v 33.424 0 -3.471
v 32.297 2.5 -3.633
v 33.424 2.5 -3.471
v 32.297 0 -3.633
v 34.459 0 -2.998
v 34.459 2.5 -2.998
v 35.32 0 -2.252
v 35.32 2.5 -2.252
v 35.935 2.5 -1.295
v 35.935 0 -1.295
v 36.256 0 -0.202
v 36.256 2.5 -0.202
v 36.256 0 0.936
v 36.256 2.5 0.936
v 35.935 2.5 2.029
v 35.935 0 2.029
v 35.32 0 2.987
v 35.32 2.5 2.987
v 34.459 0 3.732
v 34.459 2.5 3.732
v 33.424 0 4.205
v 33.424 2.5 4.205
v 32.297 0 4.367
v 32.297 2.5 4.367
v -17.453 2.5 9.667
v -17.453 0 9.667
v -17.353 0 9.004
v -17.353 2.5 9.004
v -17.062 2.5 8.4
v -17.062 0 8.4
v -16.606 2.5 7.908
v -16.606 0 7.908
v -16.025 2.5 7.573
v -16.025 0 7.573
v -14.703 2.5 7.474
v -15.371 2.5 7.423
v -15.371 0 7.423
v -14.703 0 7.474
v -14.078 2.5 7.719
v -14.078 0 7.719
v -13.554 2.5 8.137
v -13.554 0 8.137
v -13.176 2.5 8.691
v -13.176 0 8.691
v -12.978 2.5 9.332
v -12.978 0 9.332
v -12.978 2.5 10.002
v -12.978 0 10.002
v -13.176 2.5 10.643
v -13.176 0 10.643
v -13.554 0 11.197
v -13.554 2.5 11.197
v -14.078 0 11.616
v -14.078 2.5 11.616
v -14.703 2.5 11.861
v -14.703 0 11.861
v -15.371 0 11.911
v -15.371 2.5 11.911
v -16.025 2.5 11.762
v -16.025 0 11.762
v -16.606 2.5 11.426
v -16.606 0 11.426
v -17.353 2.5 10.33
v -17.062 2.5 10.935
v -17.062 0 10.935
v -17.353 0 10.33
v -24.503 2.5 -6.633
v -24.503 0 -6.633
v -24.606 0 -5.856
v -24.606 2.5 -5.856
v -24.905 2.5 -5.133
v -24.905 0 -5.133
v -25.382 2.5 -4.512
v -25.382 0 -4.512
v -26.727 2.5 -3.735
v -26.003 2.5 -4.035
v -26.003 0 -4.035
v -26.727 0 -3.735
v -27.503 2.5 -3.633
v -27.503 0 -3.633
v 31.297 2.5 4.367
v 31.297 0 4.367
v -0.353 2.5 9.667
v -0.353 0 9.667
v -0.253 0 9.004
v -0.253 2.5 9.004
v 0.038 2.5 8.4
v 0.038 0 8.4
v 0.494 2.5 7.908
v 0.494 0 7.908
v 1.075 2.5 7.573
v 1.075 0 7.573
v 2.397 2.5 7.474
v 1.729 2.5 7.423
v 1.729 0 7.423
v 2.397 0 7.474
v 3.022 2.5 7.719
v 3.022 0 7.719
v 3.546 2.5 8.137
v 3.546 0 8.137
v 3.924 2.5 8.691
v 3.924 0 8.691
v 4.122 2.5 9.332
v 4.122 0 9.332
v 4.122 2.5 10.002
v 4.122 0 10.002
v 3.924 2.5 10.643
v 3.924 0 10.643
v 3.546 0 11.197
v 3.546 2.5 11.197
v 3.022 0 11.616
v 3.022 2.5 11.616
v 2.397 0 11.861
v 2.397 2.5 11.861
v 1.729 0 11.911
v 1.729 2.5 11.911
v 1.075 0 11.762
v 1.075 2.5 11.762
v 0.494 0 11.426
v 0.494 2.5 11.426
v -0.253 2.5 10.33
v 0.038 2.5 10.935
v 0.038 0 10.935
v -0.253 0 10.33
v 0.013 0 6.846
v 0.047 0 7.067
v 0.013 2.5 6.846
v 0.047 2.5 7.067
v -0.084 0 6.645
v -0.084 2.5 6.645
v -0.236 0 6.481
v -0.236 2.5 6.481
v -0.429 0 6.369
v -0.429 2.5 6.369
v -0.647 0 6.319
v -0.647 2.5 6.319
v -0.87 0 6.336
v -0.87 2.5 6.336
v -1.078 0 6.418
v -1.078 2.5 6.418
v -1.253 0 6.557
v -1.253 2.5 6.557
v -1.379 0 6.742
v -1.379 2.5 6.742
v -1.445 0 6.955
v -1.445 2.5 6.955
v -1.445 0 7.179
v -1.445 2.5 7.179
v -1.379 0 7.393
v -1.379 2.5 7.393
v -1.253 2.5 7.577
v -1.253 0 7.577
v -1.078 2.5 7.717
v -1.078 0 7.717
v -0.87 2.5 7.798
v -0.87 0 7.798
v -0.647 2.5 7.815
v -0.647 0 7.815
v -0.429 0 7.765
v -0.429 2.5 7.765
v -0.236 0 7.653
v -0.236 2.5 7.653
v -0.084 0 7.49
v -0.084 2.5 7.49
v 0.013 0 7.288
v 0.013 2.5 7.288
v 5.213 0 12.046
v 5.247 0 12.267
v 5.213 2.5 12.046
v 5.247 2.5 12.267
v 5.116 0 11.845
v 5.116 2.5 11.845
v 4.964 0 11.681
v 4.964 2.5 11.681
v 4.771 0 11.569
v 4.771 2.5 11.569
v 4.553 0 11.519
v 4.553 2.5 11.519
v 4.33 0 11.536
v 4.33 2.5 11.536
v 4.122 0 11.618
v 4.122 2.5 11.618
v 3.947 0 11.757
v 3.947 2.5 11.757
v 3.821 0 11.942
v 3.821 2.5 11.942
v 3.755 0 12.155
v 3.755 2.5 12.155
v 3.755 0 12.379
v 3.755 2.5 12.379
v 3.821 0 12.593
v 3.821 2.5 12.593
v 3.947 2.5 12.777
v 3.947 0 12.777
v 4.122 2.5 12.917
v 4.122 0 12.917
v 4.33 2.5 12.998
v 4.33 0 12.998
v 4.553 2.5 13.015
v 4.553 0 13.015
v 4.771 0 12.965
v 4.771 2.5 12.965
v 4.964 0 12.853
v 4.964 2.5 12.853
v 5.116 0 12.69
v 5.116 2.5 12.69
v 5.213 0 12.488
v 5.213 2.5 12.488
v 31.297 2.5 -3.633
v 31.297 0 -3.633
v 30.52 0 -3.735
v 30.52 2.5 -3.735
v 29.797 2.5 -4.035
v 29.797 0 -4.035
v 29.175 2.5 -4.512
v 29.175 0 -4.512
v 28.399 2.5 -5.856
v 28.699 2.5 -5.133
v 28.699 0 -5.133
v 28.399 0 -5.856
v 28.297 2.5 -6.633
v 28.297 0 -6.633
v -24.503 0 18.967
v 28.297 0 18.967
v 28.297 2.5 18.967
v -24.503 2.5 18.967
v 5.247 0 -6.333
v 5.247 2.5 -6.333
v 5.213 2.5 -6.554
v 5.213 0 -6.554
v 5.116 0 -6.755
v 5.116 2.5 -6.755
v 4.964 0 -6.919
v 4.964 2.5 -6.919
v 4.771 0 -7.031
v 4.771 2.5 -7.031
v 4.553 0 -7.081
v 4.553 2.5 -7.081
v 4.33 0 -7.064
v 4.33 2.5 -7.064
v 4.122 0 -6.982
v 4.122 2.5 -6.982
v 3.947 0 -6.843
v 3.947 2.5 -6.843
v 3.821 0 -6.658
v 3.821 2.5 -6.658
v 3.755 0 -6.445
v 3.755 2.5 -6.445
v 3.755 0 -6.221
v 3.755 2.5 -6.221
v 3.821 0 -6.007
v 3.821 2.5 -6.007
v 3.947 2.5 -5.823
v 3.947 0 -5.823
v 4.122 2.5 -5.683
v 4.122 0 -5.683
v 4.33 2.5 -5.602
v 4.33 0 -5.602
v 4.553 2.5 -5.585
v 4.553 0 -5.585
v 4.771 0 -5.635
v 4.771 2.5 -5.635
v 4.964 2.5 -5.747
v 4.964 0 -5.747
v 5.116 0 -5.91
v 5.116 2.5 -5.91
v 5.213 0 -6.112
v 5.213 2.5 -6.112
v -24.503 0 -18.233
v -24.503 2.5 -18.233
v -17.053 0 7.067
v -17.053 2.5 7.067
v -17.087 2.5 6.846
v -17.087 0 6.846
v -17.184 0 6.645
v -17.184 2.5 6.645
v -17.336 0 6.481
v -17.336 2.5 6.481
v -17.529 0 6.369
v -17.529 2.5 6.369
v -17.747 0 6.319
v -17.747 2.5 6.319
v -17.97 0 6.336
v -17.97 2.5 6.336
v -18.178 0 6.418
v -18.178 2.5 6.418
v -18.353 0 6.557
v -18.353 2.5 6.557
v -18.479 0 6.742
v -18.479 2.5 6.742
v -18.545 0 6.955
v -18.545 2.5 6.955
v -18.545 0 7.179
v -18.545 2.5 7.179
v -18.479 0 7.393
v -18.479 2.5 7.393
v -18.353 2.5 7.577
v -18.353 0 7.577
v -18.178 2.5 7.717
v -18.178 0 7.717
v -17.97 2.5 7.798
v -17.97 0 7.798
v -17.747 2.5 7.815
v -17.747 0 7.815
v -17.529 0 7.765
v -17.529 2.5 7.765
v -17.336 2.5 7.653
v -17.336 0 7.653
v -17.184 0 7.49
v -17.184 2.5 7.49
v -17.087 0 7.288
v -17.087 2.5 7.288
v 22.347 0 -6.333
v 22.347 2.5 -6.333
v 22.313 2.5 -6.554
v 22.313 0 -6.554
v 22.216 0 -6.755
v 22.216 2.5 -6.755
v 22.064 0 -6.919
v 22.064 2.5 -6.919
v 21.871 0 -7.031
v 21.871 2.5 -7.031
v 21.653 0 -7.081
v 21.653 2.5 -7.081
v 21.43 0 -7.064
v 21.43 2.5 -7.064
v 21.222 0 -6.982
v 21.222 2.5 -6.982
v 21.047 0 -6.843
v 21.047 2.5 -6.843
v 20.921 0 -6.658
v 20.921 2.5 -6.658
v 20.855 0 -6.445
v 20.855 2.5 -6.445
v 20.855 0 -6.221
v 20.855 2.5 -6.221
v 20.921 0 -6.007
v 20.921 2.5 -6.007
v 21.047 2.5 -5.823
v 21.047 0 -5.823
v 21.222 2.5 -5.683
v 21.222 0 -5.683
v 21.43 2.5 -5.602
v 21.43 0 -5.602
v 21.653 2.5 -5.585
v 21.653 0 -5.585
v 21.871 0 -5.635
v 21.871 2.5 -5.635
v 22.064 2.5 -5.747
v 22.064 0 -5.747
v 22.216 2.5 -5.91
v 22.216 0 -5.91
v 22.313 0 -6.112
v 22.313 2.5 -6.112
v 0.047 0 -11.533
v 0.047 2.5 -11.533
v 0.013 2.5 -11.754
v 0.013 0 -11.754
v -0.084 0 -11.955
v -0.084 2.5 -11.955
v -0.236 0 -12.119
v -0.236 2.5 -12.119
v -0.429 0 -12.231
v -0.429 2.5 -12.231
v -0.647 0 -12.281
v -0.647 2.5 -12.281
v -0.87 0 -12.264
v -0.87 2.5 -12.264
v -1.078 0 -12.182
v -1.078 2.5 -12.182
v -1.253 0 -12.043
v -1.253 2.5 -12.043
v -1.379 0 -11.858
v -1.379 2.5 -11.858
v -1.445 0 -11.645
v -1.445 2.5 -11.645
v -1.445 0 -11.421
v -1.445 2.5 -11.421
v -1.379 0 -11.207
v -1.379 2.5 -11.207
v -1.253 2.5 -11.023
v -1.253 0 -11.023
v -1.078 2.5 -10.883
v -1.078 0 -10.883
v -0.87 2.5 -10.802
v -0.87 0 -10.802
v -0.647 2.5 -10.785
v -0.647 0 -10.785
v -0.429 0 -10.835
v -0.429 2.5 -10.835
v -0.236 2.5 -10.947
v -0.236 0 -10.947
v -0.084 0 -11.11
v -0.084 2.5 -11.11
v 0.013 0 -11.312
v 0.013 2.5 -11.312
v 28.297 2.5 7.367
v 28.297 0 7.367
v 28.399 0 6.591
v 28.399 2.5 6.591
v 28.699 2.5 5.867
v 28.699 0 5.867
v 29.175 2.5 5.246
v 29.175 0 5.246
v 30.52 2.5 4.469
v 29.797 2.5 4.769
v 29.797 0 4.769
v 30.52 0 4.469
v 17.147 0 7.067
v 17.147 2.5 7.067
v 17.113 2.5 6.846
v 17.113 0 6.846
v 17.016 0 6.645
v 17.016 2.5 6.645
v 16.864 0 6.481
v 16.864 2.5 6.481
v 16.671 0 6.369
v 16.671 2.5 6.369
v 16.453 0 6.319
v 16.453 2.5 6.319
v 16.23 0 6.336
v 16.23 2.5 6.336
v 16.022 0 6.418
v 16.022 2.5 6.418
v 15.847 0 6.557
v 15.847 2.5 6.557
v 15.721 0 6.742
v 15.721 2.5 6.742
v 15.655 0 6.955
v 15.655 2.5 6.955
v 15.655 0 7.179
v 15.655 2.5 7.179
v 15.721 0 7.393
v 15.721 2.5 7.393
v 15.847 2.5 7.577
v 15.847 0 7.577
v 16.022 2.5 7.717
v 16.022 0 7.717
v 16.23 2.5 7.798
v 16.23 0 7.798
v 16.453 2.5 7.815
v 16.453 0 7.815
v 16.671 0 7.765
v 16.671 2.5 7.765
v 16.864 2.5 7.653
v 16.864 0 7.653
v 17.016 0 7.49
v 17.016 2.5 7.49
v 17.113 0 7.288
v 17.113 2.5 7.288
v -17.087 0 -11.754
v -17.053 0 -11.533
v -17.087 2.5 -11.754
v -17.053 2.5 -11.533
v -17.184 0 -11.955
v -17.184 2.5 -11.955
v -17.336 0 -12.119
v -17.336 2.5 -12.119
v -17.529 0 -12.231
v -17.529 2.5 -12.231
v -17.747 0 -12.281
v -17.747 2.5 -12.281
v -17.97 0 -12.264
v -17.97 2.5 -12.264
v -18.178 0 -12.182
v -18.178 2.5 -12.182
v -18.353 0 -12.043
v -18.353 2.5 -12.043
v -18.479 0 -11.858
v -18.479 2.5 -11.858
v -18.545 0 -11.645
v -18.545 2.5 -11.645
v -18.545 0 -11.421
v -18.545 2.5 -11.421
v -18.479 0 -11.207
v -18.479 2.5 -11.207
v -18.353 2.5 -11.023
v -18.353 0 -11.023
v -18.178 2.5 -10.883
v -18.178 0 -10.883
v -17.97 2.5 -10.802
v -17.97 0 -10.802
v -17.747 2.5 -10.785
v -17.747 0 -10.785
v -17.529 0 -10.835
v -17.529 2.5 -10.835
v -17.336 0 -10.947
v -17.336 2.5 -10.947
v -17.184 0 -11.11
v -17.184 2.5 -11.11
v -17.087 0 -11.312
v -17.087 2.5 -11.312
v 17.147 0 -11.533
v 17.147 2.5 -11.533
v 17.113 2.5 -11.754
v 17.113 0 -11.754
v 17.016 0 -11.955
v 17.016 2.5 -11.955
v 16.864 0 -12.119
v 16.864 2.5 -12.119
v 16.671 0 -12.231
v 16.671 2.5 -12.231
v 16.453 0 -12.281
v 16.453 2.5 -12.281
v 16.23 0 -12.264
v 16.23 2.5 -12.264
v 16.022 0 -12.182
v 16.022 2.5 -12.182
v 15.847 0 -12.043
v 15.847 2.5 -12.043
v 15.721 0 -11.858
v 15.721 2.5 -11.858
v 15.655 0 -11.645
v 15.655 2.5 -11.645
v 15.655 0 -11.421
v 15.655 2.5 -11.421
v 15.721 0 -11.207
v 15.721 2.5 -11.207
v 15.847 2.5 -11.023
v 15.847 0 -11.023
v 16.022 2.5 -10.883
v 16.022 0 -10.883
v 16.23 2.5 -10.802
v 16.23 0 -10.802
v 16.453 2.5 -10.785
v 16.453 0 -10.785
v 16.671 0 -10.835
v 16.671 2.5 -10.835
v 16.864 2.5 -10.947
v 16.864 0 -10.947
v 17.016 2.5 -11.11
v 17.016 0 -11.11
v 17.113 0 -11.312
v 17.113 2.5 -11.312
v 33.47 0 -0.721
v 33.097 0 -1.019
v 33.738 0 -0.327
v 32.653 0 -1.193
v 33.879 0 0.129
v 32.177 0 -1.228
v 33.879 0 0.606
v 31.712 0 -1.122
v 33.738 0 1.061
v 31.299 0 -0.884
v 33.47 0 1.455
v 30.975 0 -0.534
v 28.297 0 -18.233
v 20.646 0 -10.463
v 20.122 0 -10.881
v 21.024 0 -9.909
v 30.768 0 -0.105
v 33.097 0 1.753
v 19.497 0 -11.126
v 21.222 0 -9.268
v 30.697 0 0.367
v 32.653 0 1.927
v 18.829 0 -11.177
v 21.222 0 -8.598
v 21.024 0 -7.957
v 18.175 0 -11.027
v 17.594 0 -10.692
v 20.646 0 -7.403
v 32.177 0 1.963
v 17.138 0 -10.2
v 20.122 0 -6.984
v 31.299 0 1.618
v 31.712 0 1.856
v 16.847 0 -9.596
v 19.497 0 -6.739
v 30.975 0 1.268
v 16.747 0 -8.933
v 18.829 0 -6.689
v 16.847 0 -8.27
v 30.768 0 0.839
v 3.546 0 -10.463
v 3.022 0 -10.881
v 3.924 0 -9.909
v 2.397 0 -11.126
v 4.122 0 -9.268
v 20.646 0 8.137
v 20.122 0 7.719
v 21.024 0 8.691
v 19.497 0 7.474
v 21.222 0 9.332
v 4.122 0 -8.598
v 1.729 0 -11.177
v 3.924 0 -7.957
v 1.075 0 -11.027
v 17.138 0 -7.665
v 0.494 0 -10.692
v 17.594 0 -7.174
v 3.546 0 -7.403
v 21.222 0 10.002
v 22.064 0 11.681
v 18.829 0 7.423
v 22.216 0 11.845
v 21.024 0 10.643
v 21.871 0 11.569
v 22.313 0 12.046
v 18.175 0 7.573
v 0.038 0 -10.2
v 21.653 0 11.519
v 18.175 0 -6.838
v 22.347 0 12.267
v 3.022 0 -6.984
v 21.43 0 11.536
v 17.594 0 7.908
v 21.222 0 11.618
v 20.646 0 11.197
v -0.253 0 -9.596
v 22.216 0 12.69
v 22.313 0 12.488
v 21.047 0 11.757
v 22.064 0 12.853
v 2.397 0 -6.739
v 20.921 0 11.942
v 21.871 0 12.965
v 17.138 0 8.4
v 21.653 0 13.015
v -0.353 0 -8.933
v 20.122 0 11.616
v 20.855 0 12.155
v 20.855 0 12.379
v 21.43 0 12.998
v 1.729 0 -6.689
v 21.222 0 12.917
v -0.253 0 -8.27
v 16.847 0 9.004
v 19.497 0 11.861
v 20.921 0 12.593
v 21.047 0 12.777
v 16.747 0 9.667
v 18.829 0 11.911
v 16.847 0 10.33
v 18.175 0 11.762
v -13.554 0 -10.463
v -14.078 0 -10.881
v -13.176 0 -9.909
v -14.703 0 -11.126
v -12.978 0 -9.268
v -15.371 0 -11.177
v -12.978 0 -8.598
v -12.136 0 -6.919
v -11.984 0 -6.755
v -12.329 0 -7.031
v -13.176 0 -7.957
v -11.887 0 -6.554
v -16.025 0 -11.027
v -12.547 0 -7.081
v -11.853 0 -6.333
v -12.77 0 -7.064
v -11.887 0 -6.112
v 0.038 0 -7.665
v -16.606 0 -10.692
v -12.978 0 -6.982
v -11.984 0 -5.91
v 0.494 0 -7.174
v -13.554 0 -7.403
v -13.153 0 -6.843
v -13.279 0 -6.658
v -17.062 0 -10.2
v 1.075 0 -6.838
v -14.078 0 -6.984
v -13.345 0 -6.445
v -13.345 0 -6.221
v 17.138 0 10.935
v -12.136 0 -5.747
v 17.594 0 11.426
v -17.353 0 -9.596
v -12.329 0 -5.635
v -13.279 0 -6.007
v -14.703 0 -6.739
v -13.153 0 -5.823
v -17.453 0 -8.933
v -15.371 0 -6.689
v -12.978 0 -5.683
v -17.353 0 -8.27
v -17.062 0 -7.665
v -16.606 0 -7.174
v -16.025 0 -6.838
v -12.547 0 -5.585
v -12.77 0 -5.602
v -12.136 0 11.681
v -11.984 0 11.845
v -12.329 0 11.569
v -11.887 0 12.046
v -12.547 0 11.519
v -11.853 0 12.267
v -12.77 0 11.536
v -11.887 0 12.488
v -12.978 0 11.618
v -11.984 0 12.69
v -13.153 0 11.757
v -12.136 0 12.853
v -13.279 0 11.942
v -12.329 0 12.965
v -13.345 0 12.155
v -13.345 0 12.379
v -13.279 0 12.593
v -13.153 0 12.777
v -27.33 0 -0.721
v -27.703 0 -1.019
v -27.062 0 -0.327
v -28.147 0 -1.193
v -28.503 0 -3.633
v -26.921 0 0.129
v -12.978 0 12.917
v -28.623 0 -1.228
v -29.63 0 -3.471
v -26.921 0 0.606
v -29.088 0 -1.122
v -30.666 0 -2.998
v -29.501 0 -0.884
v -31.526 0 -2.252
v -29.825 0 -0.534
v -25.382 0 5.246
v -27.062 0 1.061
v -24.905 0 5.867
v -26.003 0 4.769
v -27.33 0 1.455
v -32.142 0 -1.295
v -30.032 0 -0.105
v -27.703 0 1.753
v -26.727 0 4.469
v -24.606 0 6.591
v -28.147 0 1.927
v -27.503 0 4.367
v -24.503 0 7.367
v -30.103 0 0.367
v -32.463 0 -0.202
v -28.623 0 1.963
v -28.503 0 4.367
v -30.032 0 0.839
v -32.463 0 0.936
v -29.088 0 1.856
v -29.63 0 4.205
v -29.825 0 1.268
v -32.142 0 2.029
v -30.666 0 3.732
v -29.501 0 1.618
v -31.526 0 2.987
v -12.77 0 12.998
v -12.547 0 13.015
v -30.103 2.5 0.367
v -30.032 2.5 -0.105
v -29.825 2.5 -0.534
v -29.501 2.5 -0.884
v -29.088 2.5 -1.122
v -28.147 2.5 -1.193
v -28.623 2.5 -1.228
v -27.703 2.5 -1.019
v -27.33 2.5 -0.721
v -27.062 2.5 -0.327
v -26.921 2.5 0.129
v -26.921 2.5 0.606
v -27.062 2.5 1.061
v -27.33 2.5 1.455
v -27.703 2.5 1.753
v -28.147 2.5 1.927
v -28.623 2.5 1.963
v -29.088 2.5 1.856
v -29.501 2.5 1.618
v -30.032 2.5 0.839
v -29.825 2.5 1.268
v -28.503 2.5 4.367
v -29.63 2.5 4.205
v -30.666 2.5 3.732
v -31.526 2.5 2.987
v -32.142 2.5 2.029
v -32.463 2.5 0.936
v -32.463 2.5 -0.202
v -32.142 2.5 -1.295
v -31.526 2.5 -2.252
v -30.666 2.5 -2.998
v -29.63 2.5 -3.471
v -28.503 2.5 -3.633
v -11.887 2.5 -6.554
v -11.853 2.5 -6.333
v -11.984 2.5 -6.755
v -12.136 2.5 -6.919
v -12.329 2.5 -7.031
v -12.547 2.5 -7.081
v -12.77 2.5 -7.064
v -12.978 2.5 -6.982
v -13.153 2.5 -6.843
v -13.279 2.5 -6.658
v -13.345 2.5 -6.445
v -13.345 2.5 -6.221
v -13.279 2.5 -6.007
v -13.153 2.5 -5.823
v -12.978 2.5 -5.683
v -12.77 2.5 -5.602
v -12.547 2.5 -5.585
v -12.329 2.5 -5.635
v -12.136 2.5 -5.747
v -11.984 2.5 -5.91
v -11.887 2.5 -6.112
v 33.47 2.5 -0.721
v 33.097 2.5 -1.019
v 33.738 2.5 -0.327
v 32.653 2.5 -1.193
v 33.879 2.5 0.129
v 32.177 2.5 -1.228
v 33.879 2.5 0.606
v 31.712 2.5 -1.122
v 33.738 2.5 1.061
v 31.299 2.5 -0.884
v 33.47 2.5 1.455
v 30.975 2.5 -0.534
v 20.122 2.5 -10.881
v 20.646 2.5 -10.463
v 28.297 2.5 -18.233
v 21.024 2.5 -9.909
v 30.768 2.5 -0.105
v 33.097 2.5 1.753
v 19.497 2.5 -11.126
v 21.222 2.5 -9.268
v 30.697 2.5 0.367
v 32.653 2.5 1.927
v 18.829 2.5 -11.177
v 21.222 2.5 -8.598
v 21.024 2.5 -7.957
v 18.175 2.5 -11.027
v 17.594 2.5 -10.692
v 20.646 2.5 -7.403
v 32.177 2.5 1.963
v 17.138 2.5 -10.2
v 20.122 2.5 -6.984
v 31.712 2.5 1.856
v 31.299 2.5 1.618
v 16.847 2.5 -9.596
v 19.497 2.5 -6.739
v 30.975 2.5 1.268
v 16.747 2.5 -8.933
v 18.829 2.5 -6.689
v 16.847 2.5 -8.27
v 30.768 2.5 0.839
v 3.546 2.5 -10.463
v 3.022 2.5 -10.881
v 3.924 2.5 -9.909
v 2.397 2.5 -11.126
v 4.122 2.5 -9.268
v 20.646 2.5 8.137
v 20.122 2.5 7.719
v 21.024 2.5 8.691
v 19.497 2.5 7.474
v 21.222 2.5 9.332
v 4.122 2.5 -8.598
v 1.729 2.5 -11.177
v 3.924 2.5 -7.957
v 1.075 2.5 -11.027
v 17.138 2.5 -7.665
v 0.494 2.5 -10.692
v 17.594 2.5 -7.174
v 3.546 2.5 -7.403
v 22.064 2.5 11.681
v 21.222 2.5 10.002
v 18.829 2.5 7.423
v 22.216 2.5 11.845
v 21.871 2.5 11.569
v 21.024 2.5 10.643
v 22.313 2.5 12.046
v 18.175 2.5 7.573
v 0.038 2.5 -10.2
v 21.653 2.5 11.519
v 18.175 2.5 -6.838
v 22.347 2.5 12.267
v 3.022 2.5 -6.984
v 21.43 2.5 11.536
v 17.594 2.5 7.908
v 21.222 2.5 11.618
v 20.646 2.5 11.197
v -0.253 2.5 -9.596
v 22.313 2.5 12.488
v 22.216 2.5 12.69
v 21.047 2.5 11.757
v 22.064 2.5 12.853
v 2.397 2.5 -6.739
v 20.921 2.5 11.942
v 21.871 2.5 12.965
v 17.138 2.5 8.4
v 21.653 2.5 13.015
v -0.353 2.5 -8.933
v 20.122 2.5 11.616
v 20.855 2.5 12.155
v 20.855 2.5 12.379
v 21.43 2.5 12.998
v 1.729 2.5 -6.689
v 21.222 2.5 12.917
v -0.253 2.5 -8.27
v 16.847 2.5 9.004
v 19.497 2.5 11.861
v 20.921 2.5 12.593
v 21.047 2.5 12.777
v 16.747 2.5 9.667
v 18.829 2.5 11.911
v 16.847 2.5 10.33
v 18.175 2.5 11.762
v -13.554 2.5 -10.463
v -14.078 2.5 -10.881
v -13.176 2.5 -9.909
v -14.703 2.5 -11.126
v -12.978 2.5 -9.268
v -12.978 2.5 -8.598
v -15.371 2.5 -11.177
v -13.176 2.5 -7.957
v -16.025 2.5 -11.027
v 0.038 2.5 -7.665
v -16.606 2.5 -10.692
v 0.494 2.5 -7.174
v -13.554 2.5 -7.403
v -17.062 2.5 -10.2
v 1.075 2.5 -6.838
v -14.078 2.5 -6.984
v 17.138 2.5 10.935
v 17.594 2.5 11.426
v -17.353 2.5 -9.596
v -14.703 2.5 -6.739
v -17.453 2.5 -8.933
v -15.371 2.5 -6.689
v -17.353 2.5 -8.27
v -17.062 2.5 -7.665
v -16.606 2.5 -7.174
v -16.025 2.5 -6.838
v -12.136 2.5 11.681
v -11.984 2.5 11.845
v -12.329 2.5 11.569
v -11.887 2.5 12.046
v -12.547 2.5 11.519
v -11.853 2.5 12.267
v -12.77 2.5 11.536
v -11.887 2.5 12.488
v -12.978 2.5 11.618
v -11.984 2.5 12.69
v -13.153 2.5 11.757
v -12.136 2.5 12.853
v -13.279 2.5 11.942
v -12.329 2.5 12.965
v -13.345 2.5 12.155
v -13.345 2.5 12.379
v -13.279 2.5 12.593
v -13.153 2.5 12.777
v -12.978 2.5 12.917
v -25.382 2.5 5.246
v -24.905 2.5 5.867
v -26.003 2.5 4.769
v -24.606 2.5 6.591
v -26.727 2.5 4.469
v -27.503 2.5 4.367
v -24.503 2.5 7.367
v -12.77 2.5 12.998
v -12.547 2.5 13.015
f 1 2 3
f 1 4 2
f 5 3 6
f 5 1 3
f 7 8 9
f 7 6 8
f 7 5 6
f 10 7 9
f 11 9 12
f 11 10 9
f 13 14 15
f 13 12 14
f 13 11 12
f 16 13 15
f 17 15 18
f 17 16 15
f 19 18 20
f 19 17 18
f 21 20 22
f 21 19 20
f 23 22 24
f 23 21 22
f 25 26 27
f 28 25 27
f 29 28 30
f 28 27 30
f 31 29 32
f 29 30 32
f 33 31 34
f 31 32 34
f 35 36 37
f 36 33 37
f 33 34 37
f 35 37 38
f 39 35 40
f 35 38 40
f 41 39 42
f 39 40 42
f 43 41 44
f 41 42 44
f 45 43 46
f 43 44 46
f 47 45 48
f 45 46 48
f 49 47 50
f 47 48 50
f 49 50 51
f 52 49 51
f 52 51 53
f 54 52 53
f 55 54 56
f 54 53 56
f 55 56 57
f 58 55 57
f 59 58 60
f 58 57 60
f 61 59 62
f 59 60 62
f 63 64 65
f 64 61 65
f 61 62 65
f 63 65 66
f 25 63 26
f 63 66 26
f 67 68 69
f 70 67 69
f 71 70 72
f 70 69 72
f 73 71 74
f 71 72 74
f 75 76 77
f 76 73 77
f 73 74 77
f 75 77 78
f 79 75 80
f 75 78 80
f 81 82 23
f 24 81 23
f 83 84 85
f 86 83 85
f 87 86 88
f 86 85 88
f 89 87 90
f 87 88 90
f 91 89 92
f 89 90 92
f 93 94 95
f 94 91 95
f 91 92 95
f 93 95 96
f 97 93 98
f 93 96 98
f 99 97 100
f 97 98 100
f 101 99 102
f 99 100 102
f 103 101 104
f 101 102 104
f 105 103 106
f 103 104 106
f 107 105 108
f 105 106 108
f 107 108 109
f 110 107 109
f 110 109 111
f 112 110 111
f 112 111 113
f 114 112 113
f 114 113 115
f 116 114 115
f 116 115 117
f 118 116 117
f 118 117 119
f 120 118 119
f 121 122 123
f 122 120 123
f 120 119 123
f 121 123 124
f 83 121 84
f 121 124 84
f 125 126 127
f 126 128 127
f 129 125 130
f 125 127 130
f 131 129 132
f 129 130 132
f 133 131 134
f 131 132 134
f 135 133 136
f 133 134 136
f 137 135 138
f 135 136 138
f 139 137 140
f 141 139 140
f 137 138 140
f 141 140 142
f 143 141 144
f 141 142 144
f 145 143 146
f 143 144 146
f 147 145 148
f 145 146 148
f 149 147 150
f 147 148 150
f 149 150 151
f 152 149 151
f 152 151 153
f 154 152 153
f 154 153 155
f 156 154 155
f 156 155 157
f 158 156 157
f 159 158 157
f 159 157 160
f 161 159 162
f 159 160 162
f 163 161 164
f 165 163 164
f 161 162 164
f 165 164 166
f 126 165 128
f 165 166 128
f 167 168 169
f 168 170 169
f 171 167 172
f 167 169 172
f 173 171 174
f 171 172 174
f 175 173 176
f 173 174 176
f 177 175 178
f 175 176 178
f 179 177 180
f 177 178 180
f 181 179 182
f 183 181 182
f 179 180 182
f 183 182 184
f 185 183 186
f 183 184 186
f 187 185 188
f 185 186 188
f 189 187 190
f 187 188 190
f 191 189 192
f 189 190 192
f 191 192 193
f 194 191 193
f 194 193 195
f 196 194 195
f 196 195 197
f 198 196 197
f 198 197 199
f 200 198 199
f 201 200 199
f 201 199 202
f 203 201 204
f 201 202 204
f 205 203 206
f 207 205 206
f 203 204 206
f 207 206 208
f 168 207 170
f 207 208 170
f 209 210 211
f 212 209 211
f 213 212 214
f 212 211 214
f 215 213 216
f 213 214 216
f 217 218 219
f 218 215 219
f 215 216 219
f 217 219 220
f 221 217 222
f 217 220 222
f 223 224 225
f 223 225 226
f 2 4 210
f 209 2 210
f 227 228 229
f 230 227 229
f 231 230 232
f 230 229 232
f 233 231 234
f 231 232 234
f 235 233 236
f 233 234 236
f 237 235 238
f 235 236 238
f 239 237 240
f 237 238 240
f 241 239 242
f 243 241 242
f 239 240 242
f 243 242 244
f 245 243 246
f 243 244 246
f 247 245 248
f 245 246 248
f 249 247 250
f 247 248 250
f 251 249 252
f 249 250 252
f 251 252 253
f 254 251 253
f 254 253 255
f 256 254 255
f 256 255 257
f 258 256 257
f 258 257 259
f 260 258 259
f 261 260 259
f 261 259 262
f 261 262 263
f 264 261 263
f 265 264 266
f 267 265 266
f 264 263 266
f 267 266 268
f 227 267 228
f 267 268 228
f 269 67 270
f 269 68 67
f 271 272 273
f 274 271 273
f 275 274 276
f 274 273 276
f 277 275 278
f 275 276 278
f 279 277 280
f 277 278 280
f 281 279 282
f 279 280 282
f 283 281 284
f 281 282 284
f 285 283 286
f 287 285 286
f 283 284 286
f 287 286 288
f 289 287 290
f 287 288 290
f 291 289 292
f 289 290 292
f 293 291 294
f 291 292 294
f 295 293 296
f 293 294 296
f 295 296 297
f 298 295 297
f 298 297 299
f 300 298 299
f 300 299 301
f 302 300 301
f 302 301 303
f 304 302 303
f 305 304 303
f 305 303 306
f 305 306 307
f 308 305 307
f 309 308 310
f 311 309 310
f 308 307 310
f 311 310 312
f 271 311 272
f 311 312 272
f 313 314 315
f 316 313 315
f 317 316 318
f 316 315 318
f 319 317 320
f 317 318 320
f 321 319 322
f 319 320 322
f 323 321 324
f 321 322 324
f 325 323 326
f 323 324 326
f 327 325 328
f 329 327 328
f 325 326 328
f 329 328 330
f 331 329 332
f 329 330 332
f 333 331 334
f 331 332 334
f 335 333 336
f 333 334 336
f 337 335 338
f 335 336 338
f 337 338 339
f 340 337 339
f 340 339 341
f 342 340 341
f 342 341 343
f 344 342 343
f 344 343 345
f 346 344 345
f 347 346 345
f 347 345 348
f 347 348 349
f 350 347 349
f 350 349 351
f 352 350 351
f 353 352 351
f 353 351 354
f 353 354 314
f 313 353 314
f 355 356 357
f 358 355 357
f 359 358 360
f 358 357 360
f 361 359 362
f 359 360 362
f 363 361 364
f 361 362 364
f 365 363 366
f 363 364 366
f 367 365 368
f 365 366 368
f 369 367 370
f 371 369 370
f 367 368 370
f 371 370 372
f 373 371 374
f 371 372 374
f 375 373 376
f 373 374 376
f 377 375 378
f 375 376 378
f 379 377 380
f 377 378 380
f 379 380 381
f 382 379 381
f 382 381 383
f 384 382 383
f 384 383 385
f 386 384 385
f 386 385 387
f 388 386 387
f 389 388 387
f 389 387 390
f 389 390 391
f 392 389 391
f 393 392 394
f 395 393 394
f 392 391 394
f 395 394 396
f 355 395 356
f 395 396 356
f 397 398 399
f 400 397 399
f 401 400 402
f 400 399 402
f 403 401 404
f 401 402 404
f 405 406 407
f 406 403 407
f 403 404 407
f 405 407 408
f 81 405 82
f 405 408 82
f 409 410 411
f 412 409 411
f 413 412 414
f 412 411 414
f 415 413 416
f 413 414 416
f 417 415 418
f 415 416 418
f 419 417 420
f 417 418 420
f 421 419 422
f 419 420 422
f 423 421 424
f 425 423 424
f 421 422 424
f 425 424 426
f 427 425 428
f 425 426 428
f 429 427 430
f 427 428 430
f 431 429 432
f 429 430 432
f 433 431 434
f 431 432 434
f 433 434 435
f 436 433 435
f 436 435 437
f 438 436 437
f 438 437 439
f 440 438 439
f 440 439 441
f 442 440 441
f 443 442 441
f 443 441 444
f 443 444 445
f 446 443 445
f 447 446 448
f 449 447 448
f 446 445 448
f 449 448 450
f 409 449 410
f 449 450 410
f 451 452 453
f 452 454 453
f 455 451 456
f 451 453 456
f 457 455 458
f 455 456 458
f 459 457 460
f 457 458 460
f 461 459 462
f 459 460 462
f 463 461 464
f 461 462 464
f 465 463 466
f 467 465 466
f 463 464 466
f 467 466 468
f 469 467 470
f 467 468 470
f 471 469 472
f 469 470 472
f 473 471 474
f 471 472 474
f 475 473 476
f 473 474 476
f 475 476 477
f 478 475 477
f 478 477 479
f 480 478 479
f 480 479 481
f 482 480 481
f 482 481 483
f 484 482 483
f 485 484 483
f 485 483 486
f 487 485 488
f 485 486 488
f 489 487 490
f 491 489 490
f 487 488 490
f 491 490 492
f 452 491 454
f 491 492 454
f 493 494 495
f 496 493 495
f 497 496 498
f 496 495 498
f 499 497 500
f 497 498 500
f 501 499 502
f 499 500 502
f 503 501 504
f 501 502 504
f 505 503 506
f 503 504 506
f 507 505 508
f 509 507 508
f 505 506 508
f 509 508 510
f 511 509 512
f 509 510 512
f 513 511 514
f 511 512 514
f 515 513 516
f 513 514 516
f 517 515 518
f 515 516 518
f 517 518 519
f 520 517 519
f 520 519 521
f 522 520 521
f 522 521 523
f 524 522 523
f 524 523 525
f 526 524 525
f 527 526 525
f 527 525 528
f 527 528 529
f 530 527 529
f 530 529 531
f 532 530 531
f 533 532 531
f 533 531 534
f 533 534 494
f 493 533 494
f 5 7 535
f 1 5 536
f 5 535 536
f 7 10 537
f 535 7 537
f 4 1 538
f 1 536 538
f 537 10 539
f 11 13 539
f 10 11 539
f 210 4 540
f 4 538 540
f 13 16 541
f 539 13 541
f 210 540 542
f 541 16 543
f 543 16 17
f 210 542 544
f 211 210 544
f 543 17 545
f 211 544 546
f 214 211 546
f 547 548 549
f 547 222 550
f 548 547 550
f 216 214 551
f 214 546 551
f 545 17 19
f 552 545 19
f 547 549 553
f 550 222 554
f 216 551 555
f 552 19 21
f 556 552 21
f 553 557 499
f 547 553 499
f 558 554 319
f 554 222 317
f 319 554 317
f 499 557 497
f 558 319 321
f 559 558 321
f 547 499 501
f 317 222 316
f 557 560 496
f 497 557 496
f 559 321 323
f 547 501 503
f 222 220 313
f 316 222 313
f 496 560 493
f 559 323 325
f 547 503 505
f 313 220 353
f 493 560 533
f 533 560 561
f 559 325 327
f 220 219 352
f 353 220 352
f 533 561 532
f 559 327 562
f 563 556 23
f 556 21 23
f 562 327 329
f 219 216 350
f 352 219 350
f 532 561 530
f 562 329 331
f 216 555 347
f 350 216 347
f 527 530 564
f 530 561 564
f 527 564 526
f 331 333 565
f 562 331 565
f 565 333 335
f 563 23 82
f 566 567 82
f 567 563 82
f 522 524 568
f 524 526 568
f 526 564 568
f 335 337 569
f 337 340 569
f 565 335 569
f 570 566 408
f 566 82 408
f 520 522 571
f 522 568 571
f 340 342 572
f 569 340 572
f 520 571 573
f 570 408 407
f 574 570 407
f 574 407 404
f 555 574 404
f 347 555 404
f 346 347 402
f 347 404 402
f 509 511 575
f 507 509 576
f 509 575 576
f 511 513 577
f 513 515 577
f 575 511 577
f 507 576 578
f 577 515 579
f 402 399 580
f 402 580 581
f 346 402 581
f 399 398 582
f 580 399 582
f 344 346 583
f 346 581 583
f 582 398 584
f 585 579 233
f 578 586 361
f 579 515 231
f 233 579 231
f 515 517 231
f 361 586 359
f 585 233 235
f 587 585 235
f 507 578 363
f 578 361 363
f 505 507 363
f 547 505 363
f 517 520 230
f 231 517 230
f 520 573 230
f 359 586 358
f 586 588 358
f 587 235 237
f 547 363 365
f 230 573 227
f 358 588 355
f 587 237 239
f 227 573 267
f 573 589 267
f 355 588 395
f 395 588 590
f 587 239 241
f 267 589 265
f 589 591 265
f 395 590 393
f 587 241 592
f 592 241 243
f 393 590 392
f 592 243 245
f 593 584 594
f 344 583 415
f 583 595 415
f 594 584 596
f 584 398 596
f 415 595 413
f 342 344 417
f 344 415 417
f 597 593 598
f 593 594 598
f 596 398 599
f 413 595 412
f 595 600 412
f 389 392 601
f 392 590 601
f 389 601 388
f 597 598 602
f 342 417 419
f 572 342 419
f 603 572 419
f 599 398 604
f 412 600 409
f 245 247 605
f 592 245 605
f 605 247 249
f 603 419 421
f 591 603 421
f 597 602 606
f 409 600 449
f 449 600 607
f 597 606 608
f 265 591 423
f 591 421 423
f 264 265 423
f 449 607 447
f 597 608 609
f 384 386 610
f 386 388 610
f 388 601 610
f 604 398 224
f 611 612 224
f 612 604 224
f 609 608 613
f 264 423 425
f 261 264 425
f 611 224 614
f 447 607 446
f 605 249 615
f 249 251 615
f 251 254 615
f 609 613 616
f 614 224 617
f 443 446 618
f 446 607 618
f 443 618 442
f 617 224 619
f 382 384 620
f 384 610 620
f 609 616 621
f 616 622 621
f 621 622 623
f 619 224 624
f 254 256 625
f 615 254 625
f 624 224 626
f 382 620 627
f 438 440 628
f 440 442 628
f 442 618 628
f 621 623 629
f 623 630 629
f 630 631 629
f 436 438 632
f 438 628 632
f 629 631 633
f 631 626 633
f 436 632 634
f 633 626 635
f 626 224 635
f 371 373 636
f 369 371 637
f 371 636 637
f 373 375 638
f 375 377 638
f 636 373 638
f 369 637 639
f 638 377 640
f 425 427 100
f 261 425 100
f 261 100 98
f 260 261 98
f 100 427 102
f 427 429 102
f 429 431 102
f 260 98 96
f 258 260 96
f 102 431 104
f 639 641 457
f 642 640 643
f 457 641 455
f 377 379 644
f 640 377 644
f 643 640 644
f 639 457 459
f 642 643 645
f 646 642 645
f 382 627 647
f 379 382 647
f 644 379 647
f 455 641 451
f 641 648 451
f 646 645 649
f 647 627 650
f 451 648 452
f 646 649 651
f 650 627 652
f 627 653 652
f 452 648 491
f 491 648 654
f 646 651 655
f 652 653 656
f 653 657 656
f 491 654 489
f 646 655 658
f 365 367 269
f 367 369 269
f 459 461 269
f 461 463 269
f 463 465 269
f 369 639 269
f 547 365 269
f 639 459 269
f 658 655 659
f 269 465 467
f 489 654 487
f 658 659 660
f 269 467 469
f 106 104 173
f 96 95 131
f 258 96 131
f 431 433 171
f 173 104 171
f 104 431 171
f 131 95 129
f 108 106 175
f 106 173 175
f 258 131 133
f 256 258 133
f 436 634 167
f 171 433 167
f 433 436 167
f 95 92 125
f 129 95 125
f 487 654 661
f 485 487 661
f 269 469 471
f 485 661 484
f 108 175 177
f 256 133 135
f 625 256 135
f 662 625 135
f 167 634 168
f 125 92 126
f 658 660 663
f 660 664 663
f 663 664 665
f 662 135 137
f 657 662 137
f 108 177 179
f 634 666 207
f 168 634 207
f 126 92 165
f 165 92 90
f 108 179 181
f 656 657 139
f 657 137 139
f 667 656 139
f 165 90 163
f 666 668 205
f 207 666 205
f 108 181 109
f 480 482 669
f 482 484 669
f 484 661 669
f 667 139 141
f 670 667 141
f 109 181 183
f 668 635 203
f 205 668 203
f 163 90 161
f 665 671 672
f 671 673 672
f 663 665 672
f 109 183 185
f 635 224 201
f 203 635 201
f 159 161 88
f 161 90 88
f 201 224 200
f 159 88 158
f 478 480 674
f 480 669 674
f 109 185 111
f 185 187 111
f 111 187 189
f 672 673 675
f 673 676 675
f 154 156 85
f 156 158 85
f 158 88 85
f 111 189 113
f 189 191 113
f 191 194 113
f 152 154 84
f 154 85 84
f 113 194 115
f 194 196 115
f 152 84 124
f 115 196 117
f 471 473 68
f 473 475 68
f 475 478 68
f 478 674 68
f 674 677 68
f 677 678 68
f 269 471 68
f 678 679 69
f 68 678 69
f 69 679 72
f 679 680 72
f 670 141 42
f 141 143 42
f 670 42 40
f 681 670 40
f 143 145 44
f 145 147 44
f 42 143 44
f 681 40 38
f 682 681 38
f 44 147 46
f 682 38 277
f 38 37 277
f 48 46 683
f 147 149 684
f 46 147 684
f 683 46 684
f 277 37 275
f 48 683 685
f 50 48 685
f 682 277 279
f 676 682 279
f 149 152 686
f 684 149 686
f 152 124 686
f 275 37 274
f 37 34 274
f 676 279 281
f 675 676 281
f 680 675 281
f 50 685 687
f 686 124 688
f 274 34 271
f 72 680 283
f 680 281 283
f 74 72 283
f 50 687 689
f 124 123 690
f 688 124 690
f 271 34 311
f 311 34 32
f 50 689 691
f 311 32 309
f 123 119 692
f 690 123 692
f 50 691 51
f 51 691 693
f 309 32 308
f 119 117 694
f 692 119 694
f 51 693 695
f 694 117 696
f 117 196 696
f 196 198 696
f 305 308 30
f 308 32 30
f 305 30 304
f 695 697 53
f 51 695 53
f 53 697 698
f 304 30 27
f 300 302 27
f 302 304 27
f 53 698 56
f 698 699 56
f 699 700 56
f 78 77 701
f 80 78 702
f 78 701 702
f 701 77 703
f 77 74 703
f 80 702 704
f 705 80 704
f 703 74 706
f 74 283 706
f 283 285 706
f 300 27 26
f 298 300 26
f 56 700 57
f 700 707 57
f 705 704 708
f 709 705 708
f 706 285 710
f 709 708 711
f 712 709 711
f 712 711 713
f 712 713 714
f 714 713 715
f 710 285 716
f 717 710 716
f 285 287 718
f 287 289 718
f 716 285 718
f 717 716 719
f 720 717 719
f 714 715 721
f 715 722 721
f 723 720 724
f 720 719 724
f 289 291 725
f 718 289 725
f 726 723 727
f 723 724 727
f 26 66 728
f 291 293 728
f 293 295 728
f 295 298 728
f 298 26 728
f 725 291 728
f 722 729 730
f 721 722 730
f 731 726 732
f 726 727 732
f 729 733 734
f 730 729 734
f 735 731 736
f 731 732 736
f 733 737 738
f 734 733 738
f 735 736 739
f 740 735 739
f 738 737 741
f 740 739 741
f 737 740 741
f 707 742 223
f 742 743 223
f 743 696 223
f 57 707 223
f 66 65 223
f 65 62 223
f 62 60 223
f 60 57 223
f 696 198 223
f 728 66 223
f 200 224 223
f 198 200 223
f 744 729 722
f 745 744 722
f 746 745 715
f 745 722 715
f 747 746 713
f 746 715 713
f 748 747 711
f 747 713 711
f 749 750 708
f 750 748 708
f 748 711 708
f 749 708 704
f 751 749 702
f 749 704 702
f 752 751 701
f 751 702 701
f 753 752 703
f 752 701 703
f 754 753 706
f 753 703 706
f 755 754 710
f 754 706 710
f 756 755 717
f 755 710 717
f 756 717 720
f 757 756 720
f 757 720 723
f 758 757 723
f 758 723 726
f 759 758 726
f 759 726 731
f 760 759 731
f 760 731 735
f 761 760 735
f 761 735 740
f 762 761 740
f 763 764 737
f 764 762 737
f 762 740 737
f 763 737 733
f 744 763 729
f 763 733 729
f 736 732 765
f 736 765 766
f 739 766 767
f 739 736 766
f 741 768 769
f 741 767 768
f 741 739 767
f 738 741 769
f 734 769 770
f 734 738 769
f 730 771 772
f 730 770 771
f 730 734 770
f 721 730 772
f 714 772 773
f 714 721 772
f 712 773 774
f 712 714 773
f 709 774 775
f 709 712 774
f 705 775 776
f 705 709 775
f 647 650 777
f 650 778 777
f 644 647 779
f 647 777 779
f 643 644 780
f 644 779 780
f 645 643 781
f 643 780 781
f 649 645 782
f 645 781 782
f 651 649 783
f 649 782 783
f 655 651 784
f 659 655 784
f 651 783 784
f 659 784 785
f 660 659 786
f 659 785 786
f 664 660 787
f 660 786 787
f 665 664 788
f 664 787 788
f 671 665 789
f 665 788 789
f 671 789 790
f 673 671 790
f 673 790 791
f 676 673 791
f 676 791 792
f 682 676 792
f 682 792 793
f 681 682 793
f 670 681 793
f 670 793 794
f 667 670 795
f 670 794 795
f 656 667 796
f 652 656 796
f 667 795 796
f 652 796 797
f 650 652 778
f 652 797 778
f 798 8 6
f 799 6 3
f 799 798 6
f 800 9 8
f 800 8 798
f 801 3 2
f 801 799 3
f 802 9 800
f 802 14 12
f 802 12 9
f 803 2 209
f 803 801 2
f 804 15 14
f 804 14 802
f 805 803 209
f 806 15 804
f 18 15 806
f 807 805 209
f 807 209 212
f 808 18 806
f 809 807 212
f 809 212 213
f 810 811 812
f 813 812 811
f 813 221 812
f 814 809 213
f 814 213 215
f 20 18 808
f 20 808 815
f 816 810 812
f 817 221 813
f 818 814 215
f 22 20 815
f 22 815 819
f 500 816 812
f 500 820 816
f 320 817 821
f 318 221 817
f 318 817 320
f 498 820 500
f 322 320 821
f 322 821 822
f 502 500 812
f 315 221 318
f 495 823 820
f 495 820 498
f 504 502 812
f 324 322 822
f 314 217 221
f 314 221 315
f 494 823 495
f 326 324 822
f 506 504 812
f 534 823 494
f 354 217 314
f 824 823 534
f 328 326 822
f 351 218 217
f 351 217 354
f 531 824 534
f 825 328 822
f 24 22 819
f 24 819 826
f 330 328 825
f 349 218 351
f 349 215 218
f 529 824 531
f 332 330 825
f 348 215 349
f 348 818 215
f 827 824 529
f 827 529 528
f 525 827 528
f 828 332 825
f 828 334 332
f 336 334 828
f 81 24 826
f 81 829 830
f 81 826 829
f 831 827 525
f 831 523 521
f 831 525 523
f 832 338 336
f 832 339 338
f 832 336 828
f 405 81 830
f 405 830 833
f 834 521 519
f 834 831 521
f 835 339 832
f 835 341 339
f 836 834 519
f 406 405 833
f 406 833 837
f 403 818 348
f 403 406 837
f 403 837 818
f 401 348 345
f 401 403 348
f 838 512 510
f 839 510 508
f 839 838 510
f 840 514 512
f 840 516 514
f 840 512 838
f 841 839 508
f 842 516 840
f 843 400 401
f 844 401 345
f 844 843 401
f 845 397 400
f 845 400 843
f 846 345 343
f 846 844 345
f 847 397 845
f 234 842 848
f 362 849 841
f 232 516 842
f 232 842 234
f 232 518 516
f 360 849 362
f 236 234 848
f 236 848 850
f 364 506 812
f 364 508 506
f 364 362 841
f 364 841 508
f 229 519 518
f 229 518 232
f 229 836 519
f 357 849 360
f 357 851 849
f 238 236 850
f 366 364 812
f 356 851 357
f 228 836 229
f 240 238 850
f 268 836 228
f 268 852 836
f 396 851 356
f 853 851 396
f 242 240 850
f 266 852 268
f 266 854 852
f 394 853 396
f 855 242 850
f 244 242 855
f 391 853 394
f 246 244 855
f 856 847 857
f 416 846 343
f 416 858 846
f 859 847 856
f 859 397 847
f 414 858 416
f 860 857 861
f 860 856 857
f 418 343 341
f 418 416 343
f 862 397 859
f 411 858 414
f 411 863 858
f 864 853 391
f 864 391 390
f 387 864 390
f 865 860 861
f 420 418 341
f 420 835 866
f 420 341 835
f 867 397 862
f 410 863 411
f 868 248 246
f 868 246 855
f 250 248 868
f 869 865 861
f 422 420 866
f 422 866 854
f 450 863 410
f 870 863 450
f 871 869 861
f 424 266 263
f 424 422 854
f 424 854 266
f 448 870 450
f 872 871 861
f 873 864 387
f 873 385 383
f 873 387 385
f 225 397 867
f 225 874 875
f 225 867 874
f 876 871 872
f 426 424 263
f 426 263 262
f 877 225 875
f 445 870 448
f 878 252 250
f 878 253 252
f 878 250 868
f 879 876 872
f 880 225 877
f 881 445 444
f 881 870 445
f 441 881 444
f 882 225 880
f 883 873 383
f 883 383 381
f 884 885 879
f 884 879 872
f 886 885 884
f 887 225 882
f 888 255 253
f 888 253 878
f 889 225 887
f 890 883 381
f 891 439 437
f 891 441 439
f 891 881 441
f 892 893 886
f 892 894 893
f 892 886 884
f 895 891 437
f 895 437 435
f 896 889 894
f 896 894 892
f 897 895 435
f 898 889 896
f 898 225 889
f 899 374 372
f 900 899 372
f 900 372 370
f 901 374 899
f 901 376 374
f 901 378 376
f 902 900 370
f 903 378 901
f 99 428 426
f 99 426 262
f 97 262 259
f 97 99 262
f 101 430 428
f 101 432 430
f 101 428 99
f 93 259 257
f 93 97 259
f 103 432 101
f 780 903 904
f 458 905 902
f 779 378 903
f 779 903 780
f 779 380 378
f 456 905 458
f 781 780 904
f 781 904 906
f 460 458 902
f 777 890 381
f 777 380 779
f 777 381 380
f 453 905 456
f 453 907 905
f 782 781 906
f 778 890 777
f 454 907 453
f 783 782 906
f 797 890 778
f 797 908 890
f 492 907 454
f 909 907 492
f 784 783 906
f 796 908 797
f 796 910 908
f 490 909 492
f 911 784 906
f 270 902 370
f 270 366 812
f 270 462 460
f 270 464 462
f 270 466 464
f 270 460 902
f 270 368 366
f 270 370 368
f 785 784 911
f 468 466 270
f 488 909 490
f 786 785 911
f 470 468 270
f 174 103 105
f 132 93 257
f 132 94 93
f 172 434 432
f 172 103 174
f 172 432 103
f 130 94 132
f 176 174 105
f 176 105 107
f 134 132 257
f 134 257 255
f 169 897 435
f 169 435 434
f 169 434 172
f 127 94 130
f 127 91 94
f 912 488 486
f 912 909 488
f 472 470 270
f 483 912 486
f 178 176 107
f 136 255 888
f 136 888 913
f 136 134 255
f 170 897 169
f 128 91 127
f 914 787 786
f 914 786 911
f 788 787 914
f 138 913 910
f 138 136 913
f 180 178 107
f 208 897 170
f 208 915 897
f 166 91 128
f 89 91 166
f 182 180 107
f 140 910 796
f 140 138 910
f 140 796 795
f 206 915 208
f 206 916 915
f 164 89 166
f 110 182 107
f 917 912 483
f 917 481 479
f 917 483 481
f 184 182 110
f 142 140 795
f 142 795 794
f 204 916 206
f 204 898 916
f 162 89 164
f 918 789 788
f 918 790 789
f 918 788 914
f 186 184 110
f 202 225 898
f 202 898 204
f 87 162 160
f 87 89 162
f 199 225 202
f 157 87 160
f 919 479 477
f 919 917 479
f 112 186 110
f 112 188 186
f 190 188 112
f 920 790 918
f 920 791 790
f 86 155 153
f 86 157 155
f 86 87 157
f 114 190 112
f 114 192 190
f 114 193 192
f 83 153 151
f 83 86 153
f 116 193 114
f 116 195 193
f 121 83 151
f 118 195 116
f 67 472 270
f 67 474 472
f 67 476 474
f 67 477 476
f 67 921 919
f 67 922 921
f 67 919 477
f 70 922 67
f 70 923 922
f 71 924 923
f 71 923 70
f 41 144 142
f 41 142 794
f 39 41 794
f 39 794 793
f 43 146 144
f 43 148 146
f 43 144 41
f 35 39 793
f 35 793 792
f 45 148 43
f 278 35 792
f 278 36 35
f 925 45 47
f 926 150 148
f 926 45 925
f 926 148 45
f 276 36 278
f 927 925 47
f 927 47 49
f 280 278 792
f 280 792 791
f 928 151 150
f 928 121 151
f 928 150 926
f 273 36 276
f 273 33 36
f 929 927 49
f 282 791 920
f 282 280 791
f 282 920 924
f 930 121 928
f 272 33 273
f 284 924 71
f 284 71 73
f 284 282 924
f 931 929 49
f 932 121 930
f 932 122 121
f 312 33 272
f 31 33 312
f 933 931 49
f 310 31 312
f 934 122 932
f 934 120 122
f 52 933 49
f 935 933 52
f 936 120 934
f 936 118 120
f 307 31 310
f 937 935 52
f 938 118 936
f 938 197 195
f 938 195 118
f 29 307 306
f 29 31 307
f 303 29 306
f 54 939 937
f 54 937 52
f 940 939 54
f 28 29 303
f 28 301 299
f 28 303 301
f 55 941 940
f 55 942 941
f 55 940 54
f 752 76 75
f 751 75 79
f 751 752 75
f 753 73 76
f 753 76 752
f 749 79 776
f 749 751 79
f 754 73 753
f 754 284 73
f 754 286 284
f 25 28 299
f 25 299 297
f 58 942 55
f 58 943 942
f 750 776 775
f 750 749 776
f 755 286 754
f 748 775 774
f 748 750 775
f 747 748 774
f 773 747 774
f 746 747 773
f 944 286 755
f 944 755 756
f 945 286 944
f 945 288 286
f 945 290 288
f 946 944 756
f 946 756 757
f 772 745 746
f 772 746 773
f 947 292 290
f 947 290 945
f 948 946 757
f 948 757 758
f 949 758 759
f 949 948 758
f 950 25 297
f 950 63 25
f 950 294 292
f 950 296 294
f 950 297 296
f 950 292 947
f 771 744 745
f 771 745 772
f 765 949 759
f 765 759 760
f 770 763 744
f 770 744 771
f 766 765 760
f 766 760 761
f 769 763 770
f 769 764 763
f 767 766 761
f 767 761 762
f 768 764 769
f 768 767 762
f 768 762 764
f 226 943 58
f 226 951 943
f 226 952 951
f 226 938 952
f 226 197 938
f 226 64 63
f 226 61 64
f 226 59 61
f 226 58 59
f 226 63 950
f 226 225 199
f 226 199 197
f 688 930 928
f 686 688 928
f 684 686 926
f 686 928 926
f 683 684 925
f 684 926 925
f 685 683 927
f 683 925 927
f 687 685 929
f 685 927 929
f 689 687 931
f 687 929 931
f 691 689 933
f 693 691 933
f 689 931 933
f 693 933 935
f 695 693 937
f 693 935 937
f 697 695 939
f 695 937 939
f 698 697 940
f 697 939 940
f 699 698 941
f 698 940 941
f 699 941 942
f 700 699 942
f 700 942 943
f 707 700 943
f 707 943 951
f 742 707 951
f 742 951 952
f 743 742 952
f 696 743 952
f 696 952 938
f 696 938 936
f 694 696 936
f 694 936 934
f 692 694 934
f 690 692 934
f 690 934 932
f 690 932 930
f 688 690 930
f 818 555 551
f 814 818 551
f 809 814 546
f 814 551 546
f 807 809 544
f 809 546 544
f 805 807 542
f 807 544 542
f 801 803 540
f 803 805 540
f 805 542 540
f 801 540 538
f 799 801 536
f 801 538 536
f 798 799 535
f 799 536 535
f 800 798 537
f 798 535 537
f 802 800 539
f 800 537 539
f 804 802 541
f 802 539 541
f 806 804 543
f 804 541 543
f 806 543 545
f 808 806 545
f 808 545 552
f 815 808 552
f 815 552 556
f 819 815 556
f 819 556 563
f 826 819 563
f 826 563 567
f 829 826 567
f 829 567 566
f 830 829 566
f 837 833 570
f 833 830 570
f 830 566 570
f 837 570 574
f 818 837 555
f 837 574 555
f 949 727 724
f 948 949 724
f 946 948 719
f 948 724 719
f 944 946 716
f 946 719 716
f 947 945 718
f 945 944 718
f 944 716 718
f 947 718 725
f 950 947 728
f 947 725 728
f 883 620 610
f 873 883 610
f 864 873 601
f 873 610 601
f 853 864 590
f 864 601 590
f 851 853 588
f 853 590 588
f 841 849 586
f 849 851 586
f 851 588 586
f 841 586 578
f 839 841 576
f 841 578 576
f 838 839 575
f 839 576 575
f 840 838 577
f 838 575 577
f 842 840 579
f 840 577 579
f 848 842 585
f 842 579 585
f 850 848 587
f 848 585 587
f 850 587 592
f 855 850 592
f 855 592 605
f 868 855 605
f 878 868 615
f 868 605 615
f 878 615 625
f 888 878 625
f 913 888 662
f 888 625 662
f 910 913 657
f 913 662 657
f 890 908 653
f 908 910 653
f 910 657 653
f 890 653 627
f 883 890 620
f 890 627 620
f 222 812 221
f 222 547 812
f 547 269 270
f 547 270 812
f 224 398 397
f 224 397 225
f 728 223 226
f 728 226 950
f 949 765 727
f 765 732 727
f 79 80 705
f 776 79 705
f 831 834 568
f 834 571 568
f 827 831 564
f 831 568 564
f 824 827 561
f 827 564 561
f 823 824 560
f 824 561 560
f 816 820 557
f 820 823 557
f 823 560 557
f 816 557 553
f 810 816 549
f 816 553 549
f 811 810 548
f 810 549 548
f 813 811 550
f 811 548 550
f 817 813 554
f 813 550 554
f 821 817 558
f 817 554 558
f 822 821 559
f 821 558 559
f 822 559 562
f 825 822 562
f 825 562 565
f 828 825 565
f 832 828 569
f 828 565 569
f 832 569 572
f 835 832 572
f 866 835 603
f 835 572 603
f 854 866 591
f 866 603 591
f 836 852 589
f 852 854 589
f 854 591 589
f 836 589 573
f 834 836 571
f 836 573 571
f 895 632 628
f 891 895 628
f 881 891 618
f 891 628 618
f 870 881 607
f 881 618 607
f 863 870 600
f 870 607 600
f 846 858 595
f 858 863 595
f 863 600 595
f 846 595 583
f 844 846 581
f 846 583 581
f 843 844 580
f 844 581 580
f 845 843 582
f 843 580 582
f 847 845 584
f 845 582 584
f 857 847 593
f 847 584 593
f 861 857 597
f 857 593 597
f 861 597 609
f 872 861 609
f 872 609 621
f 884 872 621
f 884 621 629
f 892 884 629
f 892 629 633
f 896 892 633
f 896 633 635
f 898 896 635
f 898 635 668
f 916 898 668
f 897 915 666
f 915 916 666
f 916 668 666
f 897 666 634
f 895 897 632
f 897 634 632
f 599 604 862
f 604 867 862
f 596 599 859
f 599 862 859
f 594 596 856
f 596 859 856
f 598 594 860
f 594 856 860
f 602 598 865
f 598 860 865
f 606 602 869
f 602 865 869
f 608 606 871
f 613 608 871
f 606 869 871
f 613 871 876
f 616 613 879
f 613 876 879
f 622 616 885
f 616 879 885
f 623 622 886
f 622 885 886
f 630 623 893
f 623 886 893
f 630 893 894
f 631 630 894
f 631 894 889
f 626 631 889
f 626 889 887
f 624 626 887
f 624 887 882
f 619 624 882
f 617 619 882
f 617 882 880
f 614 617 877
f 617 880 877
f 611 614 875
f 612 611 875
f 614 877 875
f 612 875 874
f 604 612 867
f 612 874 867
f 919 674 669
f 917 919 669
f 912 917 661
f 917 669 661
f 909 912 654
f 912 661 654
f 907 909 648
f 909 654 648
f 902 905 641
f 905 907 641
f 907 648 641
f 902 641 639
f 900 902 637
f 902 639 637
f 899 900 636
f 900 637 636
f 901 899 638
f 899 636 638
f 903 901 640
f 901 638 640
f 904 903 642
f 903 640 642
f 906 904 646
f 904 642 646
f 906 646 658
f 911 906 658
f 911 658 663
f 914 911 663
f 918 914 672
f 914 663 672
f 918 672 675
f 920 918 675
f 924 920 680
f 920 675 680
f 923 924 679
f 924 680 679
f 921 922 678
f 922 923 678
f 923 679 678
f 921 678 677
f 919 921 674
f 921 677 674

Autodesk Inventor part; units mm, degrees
ref_plane "YZ Plane" through (0, 0, 0) normal (1, 0, 0) x (0, 1, 0)
ref_plane "XZ Plane" through (0, 0, 0) normal (0, 1, 0) x (-1, 0, 0)
ref_plane "XY Plane" through (0, 0, 0) normal (0, 0, 1) x (1, 0, 0)
sketch "Sketch1" plane through (0, 0, 0) normal (0, 1, 0) x (-1, 0, 0)
  arc A0 (27.5033, -3.6329) -> (24.5033, -6.6329) centre (27.5033, -6.6329) ccw
  arc A1 (28.5033, -3.6329) -> (28.5033, 4.3671) centre (28.5033, 0.3671) ccw
  line L0 (27.5033, -3.6329) -> (28.5033, -3.6329)
  line L1 (28.5033, 4.3671) -> (27.5033, 4.3671)
  arc A2 (24.5033, 7.3671) -> (27.5033, 4.3671) centre (27.5033, 7.3671) ccw
  line L2 (24.5033, 18.9671) -> (24.5033, 7.3671)
  line L3 (-28.2967, 18.9671) -> (24.5033, 18.9671)
  line L4 (-28.2967, 7.3671) -> (-28.2967, 18.9671)
  arc A3 (-31.2967, 4.3671) -> (-28.2967, 7.3671) centre (-31.2967, 7.3671) ccw
  line L5 (-31.2967, 4.3671) -> (-32.2967, 4.3671)
  arc A4 (-32.2967, 4.3671) -> (-32.2967, -3.6329) centre (-32.2967, 0.3671) ccw
  line L6 (-32.2967, -3.6329) -> (-31.2967, -3.6329)
  arc A5 (-28.2967, -6.6329) -> (-31.2967, -3.6329) centre (-31.2967, -6.6329) ccw
  line L7 (-28.2967, -18.2329) -> (-28.2967, -6.6329)
  line L8 (24.5033, -18.2329) -> (-28.2967, -18.2329)
  line L9 (24.5033, -6.6329) -> (24.5033, -18.2329)
  circle A6 centre (28.5033, 0.3671) radius 1.6
  circle A7 centre (-32.2967, 0.3671) radius 1.6
  circle A8 centre (-1.8967, 9.6671) radius 2.25
  circle A9 centre (15.2033, 9.6671) radius 2.25
  circle A10 centre (15.2033, -8.9329) radius 2.25
  circle A11 centre (-1.8967, -8.9329) radius 2.25
  circle A12 centre (-18.9967, -8.9329) radius 2.25
  circle A13 centre (-18.9967, 9.6671) radius 2.25
  point P0 (0, 0)
extrude "Extrusion1" add sketch "Sketch1" along normal blind 2.5
sketch "Sketch2" plane through (0, 2.5, 0) normal (0, 1, 0) x (1, 0, 0)
  line L0 (-12.6033, -12.2671) -> (-17.8033, -12.2671) construction
  line L1 (-17.8033, -12.2671) -> (-17.8033, -7.0671) construction
  line L2 (-17.8033, -7.0671) -> (-12.6033, -7.0671) construction
  line L3 (-12.6033, -7.0671) -> (-12.6033, -12.2671) construction
  circle A0 centre (-15.2033, -9.6671) radius 2.25 construction
  line L4 (-12.6033, -12.2671) -> (-17.8033, -7.0671) construction
  line L5 (-17.8033, -12.2671) -> (-12.6033, -7.0671) construction
  circle A1 centre (-17.8033, -7.0671) radius 0.75
  circle A2 centre (-12.6033, -12.2671) radius 0.75
  circle A3 centre (-17.8033, 11.5329) radius 0.75
  circle A4 centre (-12.6033, 6.3329) radius 0.75
  circle A5 centre (-0.7033, -7.0671) radius 0.75
  circle A6 centre (4.4967, -12.2671) radius 0.75
  circle A7 centre (-0.7033, 11.5329) radius 0.75
  circle A8 centre (4.4967, 6.3329) radius 0.75
  circle A9 centre (16.3967, -7.0671) radius 0.75
  circle A10 centre (21.5967, -12.2671) radius 0.75
  circle A11 centre (16.3967, 11.5329) radius 0.75
  circle A12 centre (21.5967, 6.3329) radius 0.75
  point P0 (0, 0)
  dimension "d2" = 1.5
  dimension "d3" = 1.5
  dimension "d6" = 18.6
  dimension "d9" = 17.1
  dimension "d14" = 5.2
  dimension "d15" = 5.2
extrude "Extrusion2" cut sketch "Sketch2" against normal through all
equation "\"d3\" = d2"
